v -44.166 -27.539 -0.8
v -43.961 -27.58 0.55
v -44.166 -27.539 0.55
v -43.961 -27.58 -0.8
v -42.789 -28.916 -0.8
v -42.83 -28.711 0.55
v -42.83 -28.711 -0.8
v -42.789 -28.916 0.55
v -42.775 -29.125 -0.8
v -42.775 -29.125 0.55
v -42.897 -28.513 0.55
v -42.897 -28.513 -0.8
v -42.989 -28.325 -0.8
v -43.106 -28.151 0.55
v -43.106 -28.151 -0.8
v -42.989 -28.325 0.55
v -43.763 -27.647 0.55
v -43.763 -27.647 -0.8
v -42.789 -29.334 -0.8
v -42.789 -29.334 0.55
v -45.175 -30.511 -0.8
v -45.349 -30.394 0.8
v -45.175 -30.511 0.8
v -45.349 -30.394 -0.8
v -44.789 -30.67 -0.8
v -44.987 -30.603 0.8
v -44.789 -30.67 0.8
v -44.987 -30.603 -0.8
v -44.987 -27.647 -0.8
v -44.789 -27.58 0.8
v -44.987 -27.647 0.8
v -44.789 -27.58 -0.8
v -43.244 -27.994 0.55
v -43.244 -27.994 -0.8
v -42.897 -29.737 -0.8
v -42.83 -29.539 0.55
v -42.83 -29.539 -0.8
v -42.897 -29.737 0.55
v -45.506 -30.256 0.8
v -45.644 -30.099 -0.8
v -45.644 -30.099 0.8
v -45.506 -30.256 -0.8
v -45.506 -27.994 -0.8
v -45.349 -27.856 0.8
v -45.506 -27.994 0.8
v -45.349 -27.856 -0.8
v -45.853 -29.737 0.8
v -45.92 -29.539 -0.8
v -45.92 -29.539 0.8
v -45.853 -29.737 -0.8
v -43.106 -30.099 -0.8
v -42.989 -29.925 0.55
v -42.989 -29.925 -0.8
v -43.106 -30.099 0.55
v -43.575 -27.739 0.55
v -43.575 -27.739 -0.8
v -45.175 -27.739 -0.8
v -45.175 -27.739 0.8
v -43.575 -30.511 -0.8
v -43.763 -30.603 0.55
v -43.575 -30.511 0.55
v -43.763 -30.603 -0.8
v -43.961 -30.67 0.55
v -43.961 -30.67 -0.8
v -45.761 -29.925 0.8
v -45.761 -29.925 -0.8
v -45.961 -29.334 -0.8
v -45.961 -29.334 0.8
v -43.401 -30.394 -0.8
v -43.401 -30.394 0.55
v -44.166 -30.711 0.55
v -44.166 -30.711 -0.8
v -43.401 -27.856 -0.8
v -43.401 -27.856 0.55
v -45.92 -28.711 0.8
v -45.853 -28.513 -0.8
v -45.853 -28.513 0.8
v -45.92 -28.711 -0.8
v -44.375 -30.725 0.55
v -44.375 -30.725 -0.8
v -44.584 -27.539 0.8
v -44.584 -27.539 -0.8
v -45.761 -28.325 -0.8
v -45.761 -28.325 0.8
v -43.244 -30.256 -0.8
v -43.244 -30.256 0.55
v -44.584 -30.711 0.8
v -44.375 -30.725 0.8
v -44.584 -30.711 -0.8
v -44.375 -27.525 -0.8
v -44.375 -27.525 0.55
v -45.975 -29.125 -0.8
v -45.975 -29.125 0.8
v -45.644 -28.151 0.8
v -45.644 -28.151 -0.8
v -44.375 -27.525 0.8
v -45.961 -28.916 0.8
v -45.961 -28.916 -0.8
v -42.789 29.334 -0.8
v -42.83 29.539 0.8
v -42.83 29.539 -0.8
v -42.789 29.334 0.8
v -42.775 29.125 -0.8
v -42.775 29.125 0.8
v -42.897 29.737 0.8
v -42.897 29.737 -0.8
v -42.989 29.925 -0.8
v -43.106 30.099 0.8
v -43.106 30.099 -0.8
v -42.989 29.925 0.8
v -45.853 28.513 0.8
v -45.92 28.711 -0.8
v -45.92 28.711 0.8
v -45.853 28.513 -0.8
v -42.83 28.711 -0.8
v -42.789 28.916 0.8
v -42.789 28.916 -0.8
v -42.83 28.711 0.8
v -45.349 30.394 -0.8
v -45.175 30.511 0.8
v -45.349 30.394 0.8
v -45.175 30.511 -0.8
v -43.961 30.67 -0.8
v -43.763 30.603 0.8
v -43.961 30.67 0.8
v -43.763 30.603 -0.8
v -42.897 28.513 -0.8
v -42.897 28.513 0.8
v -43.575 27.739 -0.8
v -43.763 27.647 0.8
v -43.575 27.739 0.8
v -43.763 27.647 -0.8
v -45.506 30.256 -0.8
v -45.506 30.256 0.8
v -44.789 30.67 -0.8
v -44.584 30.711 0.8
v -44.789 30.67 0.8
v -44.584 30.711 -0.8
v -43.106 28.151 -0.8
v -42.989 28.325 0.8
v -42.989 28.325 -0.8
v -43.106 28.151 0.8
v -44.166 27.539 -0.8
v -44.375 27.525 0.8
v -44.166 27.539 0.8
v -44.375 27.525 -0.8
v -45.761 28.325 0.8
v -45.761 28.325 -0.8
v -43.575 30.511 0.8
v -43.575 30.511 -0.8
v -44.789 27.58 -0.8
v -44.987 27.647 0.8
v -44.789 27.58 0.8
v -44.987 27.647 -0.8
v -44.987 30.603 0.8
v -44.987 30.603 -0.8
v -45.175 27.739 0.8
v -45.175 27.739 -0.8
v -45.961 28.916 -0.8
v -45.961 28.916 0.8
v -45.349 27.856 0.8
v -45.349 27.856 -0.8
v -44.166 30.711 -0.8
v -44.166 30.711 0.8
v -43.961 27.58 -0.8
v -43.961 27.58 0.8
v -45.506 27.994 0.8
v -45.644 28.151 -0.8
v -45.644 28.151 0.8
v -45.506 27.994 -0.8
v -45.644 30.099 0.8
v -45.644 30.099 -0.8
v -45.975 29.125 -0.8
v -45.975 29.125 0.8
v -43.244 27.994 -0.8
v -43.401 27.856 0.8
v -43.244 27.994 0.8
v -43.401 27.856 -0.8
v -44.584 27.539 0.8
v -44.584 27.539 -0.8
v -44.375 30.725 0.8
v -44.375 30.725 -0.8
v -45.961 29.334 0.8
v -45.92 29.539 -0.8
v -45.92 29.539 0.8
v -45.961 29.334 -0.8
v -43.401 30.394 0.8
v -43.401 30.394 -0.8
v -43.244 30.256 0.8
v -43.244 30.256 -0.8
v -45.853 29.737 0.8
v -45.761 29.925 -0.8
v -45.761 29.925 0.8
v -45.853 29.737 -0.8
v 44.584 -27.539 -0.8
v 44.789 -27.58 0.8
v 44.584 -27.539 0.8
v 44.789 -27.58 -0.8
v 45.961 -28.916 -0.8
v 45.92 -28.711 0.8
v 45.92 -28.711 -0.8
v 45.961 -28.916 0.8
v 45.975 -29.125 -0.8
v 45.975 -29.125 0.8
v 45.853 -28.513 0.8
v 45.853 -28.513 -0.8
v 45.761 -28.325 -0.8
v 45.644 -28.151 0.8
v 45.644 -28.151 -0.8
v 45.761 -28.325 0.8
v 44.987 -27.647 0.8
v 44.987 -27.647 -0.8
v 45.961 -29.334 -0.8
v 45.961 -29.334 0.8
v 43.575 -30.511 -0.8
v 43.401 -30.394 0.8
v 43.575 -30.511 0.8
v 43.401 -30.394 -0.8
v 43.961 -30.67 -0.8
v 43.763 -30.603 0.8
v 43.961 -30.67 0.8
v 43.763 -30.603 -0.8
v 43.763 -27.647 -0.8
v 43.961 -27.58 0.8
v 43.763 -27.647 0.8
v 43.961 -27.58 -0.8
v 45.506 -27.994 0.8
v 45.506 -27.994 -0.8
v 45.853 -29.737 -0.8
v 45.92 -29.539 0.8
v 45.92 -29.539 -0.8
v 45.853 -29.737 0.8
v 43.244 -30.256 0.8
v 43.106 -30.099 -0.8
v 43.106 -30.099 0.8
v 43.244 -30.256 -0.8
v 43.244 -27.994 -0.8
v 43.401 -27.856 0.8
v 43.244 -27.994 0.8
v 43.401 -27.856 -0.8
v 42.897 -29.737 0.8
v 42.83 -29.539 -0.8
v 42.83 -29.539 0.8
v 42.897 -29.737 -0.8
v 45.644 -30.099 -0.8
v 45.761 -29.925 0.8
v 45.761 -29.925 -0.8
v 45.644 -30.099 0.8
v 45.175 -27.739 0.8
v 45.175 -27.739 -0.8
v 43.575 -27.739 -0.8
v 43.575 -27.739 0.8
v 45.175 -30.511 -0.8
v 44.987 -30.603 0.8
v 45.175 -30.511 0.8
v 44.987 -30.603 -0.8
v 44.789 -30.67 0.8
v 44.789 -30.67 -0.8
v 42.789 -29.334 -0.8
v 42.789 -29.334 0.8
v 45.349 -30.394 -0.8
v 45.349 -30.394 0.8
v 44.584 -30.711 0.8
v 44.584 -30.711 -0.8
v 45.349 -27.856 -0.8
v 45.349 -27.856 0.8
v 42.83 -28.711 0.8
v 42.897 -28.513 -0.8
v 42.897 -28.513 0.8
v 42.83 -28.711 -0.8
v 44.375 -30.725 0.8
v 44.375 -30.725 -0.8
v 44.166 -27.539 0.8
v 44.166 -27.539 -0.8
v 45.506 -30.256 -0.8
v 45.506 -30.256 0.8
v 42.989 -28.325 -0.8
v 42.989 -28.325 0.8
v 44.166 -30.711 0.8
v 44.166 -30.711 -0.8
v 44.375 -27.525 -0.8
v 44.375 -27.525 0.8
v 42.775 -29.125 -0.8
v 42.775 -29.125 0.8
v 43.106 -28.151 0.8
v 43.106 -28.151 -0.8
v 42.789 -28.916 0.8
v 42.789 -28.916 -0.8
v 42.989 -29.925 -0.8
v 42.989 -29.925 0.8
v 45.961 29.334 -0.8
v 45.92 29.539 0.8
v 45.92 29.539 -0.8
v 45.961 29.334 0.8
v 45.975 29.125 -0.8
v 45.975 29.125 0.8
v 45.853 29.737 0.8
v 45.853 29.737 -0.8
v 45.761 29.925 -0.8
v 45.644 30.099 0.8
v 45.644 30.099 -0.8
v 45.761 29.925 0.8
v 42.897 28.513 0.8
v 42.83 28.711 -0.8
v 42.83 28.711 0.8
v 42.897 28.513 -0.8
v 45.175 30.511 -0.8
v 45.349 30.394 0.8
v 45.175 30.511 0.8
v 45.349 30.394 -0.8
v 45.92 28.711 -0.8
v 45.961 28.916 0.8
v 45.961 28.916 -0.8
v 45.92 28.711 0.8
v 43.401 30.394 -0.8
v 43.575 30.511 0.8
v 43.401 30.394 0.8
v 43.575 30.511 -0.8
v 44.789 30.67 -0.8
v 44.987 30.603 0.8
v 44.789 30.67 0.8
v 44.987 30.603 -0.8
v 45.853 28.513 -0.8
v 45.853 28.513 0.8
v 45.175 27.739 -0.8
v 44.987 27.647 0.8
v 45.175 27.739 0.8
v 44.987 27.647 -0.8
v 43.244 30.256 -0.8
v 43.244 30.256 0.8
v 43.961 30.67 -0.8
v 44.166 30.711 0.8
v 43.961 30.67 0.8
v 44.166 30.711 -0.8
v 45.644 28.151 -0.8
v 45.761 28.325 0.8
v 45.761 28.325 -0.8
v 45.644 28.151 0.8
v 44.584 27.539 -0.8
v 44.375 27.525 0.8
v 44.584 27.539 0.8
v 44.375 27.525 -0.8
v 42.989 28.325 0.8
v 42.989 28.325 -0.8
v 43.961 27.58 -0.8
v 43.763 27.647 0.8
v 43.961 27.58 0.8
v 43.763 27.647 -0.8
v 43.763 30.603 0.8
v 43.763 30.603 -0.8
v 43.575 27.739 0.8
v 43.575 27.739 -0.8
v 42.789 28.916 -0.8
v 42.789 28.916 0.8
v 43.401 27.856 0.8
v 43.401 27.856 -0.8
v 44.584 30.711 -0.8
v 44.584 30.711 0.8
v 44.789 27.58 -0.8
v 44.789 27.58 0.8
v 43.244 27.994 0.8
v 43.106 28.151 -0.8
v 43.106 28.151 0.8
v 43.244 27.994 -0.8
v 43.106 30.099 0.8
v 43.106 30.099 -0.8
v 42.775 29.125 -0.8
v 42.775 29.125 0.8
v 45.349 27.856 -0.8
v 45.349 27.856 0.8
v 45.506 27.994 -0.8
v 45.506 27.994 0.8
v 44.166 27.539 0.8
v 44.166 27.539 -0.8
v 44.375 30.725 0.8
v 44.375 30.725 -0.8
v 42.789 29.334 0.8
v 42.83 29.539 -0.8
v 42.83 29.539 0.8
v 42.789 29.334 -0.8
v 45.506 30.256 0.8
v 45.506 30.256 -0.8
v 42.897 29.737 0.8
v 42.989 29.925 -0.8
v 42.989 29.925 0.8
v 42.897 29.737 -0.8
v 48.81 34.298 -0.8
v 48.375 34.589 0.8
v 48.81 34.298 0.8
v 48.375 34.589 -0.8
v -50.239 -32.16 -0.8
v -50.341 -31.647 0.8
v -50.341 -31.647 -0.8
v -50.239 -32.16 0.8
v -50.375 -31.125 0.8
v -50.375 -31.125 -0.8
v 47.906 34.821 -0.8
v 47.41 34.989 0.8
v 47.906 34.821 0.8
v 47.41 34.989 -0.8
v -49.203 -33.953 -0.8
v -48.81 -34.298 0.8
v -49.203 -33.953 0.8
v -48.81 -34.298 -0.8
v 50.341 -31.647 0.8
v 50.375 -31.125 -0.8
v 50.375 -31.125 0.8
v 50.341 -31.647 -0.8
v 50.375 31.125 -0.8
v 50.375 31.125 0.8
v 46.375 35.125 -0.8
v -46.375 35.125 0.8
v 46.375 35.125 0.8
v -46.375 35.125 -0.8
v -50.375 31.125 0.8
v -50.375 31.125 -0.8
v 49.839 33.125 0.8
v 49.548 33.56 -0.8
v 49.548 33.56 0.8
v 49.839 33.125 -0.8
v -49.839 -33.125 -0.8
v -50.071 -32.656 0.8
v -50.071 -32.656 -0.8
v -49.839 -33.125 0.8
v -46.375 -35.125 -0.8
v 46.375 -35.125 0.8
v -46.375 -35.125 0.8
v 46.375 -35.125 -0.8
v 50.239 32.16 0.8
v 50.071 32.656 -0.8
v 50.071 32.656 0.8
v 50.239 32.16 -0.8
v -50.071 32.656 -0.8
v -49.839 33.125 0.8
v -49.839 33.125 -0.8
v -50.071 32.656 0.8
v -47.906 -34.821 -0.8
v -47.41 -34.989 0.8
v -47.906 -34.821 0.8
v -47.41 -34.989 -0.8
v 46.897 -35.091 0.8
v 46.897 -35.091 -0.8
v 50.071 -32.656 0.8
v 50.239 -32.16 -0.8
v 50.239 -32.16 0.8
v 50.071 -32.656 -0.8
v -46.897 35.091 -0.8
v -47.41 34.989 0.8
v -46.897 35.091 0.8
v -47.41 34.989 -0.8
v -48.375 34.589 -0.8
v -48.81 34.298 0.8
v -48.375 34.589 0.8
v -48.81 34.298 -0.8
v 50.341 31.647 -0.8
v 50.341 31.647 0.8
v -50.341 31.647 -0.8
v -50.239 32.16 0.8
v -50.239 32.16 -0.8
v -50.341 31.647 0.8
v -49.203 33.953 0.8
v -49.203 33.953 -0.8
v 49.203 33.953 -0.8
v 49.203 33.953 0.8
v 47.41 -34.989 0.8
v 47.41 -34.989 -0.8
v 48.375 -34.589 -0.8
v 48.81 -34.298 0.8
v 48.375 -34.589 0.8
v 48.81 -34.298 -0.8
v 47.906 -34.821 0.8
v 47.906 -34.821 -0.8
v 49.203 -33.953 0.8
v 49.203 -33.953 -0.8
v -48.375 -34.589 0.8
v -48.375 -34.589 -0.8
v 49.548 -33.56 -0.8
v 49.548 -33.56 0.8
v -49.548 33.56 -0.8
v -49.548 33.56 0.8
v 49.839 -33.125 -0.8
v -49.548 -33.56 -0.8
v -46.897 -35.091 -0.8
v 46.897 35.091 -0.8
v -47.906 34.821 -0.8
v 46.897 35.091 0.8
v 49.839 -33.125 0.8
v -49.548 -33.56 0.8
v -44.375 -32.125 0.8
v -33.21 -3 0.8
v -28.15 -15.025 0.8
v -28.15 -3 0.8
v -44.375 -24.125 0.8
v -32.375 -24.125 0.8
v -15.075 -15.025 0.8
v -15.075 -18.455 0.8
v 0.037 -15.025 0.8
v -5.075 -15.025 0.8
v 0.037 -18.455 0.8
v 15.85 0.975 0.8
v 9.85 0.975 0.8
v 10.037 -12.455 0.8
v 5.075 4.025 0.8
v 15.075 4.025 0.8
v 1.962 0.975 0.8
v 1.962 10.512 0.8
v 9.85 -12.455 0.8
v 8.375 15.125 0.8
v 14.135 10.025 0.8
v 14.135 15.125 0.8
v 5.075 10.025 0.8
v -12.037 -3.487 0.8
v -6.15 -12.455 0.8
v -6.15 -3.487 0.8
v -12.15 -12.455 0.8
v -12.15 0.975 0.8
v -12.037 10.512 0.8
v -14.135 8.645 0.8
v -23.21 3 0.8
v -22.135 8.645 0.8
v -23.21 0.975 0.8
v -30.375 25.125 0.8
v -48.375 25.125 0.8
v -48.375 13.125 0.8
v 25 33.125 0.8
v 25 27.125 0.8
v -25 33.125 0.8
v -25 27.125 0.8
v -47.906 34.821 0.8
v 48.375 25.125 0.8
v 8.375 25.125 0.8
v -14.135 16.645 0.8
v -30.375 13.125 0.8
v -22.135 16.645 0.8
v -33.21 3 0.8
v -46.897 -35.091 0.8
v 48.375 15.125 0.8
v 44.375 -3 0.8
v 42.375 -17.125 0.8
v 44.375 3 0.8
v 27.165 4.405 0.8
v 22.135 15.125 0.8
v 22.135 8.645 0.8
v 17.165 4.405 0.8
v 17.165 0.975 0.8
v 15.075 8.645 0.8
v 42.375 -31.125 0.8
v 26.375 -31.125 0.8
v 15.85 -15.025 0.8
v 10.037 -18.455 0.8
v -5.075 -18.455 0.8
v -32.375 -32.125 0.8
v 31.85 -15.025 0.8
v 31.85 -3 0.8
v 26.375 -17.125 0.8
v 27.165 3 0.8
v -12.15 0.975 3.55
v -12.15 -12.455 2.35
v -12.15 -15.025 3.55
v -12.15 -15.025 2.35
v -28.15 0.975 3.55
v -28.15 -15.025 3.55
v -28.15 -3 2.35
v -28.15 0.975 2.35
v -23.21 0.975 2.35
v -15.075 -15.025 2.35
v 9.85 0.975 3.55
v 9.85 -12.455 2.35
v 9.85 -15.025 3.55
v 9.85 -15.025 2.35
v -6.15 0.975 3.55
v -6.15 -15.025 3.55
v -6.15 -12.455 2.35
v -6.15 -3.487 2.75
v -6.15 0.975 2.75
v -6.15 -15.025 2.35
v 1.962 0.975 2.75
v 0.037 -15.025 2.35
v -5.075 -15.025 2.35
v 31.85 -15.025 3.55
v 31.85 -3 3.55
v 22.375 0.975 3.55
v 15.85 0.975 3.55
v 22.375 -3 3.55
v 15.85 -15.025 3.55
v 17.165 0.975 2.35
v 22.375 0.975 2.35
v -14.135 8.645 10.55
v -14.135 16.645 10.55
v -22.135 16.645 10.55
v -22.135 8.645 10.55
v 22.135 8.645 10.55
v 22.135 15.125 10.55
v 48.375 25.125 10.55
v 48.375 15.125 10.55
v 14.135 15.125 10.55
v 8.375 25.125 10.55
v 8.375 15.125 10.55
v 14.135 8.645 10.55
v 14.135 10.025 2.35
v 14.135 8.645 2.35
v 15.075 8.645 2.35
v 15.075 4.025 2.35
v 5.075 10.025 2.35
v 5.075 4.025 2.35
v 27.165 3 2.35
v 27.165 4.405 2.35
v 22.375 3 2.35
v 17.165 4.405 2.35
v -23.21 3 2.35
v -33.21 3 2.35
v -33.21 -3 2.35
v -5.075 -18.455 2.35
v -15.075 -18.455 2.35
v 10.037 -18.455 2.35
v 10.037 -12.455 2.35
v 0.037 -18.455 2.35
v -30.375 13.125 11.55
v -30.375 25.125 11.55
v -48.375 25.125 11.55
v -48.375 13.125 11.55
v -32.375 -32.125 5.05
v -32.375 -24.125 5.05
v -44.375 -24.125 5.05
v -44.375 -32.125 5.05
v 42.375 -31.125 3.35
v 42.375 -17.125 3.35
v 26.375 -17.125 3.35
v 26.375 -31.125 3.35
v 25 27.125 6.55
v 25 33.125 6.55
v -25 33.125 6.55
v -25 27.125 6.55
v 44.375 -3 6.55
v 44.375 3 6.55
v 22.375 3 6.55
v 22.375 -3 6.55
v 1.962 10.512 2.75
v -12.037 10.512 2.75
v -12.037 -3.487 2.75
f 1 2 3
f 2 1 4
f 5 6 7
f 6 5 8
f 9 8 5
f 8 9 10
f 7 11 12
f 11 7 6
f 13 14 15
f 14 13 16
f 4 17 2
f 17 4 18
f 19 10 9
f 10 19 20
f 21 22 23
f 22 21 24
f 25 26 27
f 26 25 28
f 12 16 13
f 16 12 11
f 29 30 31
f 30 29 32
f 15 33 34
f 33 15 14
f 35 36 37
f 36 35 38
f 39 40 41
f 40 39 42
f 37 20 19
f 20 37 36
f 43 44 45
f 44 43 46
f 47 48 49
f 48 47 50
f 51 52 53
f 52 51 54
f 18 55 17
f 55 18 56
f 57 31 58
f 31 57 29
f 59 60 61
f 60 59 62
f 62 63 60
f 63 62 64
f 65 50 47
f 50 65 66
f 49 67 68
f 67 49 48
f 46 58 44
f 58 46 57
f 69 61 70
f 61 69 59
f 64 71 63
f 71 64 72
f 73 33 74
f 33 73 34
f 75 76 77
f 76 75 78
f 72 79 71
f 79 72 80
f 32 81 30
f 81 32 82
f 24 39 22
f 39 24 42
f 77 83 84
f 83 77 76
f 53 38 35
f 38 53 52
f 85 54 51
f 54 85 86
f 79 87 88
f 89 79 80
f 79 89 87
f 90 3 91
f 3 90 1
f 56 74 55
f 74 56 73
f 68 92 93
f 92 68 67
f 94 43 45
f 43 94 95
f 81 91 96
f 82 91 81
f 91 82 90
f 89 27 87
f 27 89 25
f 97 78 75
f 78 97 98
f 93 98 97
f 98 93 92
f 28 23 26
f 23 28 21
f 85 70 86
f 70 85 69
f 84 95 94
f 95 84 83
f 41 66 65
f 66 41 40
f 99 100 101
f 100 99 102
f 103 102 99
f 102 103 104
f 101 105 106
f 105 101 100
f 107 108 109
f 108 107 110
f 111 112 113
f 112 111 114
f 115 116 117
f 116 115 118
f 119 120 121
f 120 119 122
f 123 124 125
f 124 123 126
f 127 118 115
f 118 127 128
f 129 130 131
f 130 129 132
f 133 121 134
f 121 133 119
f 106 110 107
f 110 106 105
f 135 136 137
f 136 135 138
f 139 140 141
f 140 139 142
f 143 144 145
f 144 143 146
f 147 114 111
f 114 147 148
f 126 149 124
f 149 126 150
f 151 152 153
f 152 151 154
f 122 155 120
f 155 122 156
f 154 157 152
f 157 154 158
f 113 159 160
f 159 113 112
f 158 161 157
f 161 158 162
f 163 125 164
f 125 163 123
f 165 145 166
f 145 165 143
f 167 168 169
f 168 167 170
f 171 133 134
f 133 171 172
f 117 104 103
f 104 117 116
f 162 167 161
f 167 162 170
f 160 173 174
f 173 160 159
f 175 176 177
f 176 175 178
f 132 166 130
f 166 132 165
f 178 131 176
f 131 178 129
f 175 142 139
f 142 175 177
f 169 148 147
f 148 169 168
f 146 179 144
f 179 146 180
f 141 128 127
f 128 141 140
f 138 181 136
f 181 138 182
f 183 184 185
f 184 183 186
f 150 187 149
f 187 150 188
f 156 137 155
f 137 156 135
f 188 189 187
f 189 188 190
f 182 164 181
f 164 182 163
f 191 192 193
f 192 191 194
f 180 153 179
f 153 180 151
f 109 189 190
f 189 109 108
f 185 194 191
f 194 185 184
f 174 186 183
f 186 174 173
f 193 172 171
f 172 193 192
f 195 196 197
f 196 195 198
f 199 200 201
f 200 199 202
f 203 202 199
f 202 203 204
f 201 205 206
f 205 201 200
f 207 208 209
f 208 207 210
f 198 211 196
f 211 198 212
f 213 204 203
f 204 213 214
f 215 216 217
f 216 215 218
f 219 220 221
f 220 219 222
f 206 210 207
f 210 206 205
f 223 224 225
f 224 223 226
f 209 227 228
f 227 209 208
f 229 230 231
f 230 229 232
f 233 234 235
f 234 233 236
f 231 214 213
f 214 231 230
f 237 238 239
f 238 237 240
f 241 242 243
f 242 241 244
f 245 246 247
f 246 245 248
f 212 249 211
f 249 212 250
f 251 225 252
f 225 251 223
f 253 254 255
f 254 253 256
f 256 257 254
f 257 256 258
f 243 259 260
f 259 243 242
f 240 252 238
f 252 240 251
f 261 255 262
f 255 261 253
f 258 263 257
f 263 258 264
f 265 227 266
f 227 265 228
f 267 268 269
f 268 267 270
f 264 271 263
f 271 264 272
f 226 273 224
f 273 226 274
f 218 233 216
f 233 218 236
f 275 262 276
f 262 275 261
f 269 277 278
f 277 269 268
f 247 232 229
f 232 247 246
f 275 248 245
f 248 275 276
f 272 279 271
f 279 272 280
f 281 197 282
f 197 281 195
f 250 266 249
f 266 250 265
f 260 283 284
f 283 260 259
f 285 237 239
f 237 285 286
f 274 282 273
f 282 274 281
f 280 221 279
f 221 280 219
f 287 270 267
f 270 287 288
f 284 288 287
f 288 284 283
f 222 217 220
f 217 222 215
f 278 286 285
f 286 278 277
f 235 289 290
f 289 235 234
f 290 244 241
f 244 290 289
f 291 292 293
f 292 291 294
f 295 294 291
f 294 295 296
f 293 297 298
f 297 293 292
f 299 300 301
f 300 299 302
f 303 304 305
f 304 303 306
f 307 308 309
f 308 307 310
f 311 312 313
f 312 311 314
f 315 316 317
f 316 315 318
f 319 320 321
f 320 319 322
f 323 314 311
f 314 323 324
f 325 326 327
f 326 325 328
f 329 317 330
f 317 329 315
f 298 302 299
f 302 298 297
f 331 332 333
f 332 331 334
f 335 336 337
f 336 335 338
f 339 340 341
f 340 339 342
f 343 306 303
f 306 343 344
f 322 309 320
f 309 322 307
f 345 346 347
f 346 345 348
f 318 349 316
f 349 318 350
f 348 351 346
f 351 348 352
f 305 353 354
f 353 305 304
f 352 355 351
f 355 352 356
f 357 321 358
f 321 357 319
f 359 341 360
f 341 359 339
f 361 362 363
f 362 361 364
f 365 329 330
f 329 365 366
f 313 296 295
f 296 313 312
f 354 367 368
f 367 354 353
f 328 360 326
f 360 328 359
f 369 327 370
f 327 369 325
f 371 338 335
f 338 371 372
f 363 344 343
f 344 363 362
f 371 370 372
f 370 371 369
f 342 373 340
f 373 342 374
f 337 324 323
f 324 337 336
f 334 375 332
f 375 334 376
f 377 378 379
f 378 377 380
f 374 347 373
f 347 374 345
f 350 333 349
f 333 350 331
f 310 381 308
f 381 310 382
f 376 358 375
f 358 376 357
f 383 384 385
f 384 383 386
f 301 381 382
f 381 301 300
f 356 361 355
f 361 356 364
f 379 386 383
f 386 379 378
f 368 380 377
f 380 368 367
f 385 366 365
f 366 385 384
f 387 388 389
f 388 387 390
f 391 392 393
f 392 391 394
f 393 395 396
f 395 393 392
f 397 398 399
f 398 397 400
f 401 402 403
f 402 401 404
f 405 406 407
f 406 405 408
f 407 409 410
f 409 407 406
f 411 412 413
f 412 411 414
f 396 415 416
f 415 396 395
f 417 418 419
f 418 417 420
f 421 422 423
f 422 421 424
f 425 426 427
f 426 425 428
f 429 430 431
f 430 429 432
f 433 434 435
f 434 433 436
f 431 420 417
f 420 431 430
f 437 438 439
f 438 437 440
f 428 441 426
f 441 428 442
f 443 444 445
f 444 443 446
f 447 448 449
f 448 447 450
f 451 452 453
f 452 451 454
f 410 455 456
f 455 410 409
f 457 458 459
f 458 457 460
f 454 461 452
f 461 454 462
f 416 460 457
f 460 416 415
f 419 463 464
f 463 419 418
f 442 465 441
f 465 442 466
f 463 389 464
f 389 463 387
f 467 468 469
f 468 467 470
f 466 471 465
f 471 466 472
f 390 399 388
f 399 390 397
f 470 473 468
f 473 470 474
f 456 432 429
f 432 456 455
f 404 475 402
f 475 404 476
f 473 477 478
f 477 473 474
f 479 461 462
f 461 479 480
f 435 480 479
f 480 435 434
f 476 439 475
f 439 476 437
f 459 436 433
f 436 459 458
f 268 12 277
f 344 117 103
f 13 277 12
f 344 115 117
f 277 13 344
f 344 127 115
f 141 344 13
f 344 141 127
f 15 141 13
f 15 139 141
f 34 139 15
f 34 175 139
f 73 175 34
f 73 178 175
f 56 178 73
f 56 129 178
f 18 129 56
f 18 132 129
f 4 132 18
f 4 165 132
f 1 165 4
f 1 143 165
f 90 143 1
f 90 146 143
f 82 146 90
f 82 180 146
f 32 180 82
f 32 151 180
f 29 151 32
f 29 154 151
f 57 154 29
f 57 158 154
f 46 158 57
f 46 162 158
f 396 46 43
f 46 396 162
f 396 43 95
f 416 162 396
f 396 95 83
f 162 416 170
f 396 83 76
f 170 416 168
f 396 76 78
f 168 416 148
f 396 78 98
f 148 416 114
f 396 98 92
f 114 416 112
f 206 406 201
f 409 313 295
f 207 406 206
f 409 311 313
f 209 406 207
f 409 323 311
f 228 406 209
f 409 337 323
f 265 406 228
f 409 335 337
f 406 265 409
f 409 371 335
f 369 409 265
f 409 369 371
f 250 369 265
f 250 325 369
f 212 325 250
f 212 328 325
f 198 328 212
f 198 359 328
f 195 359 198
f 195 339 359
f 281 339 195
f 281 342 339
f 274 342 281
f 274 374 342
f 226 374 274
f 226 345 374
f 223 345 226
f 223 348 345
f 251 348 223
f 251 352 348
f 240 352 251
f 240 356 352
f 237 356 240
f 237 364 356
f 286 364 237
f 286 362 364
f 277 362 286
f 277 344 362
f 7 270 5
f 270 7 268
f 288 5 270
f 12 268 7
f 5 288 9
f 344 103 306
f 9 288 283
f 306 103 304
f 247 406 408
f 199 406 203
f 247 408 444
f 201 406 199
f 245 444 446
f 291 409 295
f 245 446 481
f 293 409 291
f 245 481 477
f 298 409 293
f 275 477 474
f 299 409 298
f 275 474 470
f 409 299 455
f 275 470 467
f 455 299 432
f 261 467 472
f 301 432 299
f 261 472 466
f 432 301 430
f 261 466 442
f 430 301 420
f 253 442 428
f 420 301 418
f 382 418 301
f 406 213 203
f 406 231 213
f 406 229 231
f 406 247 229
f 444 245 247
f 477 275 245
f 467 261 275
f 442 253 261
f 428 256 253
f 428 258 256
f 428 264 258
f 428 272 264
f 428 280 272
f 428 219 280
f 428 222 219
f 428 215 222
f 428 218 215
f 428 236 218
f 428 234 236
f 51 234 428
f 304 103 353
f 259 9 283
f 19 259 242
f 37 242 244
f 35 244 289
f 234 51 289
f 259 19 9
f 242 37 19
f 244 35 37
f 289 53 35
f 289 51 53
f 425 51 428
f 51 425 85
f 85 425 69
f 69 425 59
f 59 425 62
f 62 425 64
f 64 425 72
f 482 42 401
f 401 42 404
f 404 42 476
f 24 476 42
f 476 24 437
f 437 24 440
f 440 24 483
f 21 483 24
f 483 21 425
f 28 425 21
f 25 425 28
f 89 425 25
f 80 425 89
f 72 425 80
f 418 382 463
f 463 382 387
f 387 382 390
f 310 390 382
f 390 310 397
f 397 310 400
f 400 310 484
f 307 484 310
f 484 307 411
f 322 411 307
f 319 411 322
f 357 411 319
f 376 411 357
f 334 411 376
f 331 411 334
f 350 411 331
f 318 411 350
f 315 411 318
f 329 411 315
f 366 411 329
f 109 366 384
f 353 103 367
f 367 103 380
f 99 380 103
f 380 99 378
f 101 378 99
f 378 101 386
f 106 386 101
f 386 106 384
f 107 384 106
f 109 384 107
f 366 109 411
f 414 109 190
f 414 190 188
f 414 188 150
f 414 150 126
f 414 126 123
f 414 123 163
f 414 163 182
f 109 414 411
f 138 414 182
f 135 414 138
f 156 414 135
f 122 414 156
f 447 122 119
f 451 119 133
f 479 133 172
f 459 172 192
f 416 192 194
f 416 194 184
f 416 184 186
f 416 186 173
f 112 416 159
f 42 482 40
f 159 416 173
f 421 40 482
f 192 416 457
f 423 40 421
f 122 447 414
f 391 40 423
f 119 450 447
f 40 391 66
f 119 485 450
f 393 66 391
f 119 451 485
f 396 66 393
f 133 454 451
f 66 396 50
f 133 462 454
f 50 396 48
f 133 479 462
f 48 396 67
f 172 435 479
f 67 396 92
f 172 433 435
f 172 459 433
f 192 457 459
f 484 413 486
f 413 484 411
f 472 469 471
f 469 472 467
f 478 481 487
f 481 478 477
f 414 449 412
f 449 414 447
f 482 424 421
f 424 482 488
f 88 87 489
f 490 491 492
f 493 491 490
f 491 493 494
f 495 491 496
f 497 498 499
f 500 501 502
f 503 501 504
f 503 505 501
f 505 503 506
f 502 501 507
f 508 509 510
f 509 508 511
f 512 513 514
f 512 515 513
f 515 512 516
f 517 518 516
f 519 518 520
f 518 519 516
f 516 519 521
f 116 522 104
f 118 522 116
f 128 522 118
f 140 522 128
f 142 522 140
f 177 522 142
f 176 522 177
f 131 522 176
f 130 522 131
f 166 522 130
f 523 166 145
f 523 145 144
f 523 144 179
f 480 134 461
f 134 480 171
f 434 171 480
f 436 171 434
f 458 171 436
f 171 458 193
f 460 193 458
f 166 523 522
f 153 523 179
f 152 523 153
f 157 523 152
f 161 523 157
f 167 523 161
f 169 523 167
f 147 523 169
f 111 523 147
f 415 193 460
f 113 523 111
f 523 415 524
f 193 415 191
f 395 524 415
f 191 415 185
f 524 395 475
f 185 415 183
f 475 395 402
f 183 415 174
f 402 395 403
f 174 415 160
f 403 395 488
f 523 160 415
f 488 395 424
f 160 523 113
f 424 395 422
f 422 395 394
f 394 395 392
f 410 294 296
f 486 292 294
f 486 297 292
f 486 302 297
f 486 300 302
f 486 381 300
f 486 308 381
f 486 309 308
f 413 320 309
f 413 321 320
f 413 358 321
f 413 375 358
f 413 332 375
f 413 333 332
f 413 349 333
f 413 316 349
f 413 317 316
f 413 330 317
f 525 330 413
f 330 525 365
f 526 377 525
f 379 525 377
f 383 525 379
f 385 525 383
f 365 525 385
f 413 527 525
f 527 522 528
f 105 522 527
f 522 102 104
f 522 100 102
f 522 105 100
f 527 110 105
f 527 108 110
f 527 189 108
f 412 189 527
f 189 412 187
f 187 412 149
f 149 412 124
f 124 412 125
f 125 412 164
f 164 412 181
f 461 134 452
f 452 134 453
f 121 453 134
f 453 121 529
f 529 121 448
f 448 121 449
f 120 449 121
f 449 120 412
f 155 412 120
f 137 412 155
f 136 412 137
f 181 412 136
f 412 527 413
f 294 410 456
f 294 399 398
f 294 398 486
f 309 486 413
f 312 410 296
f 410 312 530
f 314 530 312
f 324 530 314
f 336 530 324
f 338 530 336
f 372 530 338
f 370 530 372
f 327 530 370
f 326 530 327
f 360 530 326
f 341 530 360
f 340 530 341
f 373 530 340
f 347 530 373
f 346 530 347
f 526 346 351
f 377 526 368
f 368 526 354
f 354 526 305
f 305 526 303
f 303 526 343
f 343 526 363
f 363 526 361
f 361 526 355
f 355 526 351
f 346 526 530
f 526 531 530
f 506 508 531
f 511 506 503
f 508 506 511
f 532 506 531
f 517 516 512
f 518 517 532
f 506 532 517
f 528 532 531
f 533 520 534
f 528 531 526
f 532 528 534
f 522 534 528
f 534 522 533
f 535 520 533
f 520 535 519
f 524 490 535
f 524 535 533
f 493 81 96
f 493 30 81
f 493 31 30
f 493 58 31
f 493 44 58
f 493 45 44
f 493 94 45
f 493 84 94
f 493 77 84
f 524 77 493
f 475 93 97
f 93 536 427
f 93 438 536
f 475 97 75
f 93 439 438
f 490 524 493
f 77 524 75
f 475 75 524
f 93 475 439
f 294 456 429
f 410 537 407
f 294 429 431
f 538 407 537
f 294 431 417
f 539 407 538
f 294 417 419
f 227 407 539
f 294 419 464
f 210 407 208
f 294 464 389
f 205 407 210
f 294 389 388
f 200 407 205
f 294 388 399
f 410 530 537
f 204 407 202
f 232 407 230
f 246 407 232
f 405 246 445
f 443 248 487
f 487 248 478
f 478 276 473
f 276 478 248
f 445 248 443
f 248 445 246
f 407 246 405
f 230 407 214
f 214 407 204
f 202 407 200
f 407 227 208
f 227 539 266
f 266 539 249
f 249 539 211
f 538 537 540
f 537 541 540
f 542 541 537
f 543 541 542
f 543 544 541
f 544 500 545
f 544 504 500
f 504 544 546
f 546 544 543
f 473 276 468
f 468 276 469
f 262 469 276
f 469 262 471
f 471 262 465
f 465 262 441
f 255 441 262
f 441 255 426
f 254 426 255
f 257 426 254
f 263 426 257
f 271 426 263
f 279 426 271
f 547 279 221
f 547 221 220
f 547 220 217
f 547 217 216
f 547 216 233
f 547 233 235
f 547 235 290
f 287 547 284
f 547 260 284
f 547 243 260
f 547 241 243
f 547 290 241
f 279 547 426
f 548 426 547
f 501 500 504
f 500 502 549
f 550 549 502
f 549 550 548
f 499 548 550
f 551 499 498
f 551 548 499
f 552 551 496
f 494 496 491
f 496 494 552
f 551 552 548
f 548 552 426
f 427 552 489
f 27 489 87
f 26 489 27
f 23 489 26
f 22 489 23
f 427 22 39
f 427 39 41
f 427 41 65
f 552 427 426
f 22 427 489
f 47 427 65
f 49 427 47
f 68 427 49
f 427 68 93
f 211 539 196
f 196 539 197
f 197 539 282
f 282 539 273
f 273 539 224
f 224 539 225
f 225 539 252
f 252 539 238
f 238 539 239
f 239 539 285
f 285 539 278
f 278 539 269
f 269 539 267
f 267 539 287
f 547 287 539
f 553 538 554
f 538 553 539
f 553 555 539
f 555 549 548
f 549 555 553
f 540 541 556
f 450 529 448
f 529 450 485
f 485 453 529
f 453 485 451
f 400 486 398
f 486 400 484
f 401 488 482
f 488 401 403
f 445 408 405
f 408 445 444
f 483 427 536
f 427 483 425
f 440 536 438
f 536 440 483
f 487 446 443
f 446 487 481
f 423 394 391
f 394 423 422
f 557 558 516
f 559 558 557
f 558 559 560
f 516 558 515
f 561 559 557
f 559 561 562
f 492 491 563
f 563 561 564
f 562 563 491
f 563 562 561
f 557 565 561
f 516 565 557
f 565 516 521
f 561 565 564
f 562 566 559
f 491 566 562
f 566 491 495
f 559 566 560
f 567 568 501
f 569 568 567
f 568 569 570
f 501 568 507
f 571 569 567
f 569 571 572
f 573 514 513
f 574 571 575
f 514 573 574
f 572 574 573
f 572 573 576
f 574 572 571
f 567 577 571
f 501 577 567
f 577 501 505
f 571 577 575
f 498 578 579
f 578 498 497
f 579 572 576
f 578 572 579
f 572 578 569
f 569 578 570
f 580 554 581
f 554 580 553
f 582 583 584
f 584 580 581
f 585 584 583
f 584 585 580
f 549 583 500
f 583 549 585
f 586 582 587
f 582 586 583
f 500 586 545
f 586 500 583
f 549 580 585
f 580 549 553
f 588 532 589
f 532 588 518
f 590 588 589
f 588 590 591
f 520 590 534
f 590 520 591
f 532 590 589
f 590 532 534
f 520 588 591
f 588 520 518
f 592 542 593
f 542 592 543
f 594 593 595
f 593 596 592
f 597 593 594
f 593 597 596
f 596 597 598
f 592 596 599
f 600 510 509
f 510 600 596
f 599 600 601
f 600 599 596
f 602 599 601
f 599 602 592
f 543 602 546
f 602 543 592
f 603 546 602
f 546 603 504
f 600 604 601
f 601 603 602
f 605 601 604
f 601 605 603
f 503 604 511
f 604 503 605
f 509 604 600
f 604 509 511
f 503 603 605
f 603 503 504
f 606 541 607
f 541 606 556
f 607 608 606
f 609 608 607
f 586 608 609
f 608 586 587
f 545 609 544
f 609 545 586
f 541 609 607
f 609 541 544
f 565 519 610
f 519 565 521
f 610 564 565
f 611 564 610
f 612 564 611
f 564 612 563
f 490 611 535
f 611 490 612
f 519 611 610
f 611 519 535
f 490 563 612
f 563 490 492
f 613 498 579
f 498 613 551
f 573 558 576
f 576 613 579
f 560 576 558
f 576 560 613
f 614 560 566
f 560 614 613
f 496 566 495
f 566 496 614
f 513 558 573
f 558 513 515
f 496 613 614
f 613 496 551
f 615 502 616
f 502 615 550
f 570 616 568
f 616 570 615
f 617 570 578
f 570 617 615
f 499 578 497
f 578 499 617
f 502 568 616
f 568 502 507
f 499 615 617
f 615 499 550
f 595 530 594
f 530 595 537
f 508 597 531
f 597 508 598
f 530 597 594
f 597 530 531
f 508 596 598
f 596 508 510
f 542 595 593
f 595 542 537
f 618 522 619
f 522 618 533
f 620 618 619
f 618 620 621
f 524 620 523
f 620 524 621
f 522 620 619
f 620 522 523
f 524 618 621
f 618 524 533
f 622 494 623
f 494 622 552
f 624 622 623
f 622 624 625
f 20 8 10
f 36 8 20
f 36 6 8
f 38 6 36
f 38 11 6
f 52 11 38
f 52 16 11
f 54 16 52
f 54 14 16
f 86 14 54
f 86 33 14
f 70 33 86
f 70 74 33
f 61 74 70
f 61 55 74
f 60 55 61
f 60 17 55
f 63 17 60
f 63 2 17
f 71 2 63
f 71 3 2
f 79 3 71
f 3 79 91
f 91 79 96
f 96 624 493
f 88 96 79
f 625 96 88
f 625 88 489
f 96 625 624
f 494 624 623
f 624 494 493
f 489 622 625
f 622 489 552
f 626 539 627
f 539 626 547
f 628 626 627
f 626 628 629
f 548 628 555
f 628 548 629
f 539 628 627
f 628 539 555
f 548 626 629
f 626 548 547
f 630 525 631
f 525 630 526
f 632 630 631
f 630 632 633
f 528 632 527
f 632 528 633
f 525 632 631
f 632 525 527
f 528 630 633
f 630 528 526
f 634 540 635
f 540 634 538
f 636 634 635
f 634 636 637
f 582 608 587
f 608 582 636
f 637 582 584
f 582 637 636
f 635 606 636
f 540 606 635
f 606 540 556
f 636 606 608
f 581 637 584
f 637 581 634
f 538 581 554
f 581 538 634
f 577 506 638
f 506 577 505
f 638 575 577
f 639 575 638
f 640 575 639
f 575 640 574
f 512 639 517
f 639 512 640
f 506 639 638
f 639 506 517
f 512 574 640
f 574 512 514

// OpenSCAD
// 3D printer mainboard (generic) - 100.75mm x 70.25mm x 1.6mm PCB
// One connected solid, with mounting holes and representative components.
// All placements are formula-based from board dimensions.

$fn = 48;

// Parameters
length = 100.75;   // X
width  = 70.25;    // Y
thickness = 1.6;   // Z

// Small overlap to guarantee connectivity between parts
overlap = 0.25;

// Helpers
module rounded_rect_2d(l, w, r) {
    // r must be <= min(l,w)/2
    hull() {
        for (sx = [-1, 1], sy = [-1, 1])
            translate([sx*(l/2 - r), sy*(w/2 - r)]) circle(r=r);
    }
}

module pcb_with_holes(l, w, t, corner_r, hole_d, hole_edge_x, hole_edge_y) {
    // hole_edge_* are distances from board edges to hole centers
    difference() {
        linear_extrude(height=t, center=true)
            rounded_rect_2d(l, w, corner_r);

        // 4 mounting holes
        for (sx = [-1, 1], sy = [-1, 1]) {
            translate([sx*(l/2 - hole_edge_x), sy*(w/2 - hole_edge_y), 0])
                cylinder(d=hole_d, h=t + 2, center=true);
        }
    }
}

module chip_pkg(x, y, z, pos=[0,0,0], col="Black") {
    // z is total height above PCB top; ensure overlap into PCB
    translate([pos[0], pos[1], thickness/2 + z/2 - overlap])
        color(col) cube([x, y, z], center=true);
}

module connector_block(x, y, z, pos=[0,0,0], col=[0.15,0.15,0.15]) {
    translate([pos[0], pos[1], thickness/2 + z/2 - overlap])
        color(col) cube([x, y, z], center=true);
}

module pin_header(x, y, z, pos=[0,0,0], col=[0.05,0.05,0.05]) {
    translate([pos[0], pos[1], thickness/2 + z/2 - overlap])
        color(col) cube([x, y, z], center=true);
}

module mainboard() {
    // Board features (generic but recognizable)
    corner_r = min(4, min(length, width)/10);
    hole_d = 3.2;
    hole_edge_x = 6.0;
    hole_edge_y = 6.0;

    // Component sizes (approximate)
    mcu = [14, 14, 2.2];
    driver = [16, 16, 3.0];
    usb = [12, 8, 4.5];
    sd  = [16, 14, 2.8];
    term = [40, 10, 10];
    power = [18, 12, 11];
    header_long = [50, 6, 6];
    header_short = [22, 6, 6];
    cap = [8, 8, 10];

    union() {
        // PCB
        color([0.0, 0.35, 0.18])
            pcb_with_holes(length, width, thickness, corner_r, hole_d, hole_edge_x, hole_edge_y);

        // Major connectors along edges (kept within board outline)
        // Right edge: screw terminal block
        connector_block(term[0], term[1], term[2],
            pos=[ length/2 - term[0]/2 - 2,  width/2 - term[1]/2 - 10, 0],
            col=[0.12,0.12,0.12]);

        // Left edge: power connector
        connector_block(power[0], power[1], power[2],
            pos=[-length/2 + power[0]/2 + 2,  width/2 - power[1]/2 - 10, 0],
            col=[0.12,0.12,0.12]);

        // Bottom edge: USB connector
        connector_block(usb[0], usb[1], usb[2],
            pos=[-length/2 + usb[0]/2 + 6, -width/2 + usb[1]/2 + 3, 0],
            col=[0.18,0.18,0.18]);

        // Bottom edge: SD card slot
        connector_block(sd[0], sd[1], sd[2],
            pos=[ length/2 - sd[0]/2 - 8, -width/2 + sd[1]/2 + 4, 0],
            col=[0.18,0.18,0.18]);

        // Top edge: long pin header
        pin_header(header_long[0], header_long[1], header_long[2],
            pos=[0, width/2 - header_long[1]/2 - 2, 0],
            col=[0.08,0.08,0.08]);

        // Mid-right: short header
        pin_header(header_short[0], header_short[1], header_short[2],
            pos=[ length/2 - header_short[0]/2 - 6, 0, 0],
            col=[0.08,0.08,0.08]);

        // Central MCU
        chip_pkg(mcu[0], mcu[1], mcu[2],
            pos=[-length*0.05, width*0.05, 0],
            col="Black");

        // Stepper driver packages (3x)
        for (i = [0:2]) {
            chip_pkg(driver[0], driver[1], driver[2],
                pos=[-length*0.20 + i*(driver[0] + 6), -width*0.10, 0],
                col=[0.05,0.05,0.05]);
        }

        // Capacitors (2x)
        for (sx = [-1, 1]) {
            translate([sx*(length*0.18), width*0.18, thickness/2 + cap[2]/2 - overlap])
                color([0.1,0.1,0.1])
                    cube([cap[0], cap[1], cap[2]], center=true);
        }

        // Small ICs / regulators (sprinkled)
        for (p = [
            [ length*0.10,  width*0.10],
            [ length*0.22,  width*0.02],
            [-length*0.28,  width*0.00],
            [-length*0.10, -width*0.22],
            [ length*0.05, -width*0.22]
        ]) {
            chip_pkg(10, 6, 1.8, pos=[p[0], p[1], 0], col=[0.06,0.06,0.06]);
        }
    }
}

mainboard();
